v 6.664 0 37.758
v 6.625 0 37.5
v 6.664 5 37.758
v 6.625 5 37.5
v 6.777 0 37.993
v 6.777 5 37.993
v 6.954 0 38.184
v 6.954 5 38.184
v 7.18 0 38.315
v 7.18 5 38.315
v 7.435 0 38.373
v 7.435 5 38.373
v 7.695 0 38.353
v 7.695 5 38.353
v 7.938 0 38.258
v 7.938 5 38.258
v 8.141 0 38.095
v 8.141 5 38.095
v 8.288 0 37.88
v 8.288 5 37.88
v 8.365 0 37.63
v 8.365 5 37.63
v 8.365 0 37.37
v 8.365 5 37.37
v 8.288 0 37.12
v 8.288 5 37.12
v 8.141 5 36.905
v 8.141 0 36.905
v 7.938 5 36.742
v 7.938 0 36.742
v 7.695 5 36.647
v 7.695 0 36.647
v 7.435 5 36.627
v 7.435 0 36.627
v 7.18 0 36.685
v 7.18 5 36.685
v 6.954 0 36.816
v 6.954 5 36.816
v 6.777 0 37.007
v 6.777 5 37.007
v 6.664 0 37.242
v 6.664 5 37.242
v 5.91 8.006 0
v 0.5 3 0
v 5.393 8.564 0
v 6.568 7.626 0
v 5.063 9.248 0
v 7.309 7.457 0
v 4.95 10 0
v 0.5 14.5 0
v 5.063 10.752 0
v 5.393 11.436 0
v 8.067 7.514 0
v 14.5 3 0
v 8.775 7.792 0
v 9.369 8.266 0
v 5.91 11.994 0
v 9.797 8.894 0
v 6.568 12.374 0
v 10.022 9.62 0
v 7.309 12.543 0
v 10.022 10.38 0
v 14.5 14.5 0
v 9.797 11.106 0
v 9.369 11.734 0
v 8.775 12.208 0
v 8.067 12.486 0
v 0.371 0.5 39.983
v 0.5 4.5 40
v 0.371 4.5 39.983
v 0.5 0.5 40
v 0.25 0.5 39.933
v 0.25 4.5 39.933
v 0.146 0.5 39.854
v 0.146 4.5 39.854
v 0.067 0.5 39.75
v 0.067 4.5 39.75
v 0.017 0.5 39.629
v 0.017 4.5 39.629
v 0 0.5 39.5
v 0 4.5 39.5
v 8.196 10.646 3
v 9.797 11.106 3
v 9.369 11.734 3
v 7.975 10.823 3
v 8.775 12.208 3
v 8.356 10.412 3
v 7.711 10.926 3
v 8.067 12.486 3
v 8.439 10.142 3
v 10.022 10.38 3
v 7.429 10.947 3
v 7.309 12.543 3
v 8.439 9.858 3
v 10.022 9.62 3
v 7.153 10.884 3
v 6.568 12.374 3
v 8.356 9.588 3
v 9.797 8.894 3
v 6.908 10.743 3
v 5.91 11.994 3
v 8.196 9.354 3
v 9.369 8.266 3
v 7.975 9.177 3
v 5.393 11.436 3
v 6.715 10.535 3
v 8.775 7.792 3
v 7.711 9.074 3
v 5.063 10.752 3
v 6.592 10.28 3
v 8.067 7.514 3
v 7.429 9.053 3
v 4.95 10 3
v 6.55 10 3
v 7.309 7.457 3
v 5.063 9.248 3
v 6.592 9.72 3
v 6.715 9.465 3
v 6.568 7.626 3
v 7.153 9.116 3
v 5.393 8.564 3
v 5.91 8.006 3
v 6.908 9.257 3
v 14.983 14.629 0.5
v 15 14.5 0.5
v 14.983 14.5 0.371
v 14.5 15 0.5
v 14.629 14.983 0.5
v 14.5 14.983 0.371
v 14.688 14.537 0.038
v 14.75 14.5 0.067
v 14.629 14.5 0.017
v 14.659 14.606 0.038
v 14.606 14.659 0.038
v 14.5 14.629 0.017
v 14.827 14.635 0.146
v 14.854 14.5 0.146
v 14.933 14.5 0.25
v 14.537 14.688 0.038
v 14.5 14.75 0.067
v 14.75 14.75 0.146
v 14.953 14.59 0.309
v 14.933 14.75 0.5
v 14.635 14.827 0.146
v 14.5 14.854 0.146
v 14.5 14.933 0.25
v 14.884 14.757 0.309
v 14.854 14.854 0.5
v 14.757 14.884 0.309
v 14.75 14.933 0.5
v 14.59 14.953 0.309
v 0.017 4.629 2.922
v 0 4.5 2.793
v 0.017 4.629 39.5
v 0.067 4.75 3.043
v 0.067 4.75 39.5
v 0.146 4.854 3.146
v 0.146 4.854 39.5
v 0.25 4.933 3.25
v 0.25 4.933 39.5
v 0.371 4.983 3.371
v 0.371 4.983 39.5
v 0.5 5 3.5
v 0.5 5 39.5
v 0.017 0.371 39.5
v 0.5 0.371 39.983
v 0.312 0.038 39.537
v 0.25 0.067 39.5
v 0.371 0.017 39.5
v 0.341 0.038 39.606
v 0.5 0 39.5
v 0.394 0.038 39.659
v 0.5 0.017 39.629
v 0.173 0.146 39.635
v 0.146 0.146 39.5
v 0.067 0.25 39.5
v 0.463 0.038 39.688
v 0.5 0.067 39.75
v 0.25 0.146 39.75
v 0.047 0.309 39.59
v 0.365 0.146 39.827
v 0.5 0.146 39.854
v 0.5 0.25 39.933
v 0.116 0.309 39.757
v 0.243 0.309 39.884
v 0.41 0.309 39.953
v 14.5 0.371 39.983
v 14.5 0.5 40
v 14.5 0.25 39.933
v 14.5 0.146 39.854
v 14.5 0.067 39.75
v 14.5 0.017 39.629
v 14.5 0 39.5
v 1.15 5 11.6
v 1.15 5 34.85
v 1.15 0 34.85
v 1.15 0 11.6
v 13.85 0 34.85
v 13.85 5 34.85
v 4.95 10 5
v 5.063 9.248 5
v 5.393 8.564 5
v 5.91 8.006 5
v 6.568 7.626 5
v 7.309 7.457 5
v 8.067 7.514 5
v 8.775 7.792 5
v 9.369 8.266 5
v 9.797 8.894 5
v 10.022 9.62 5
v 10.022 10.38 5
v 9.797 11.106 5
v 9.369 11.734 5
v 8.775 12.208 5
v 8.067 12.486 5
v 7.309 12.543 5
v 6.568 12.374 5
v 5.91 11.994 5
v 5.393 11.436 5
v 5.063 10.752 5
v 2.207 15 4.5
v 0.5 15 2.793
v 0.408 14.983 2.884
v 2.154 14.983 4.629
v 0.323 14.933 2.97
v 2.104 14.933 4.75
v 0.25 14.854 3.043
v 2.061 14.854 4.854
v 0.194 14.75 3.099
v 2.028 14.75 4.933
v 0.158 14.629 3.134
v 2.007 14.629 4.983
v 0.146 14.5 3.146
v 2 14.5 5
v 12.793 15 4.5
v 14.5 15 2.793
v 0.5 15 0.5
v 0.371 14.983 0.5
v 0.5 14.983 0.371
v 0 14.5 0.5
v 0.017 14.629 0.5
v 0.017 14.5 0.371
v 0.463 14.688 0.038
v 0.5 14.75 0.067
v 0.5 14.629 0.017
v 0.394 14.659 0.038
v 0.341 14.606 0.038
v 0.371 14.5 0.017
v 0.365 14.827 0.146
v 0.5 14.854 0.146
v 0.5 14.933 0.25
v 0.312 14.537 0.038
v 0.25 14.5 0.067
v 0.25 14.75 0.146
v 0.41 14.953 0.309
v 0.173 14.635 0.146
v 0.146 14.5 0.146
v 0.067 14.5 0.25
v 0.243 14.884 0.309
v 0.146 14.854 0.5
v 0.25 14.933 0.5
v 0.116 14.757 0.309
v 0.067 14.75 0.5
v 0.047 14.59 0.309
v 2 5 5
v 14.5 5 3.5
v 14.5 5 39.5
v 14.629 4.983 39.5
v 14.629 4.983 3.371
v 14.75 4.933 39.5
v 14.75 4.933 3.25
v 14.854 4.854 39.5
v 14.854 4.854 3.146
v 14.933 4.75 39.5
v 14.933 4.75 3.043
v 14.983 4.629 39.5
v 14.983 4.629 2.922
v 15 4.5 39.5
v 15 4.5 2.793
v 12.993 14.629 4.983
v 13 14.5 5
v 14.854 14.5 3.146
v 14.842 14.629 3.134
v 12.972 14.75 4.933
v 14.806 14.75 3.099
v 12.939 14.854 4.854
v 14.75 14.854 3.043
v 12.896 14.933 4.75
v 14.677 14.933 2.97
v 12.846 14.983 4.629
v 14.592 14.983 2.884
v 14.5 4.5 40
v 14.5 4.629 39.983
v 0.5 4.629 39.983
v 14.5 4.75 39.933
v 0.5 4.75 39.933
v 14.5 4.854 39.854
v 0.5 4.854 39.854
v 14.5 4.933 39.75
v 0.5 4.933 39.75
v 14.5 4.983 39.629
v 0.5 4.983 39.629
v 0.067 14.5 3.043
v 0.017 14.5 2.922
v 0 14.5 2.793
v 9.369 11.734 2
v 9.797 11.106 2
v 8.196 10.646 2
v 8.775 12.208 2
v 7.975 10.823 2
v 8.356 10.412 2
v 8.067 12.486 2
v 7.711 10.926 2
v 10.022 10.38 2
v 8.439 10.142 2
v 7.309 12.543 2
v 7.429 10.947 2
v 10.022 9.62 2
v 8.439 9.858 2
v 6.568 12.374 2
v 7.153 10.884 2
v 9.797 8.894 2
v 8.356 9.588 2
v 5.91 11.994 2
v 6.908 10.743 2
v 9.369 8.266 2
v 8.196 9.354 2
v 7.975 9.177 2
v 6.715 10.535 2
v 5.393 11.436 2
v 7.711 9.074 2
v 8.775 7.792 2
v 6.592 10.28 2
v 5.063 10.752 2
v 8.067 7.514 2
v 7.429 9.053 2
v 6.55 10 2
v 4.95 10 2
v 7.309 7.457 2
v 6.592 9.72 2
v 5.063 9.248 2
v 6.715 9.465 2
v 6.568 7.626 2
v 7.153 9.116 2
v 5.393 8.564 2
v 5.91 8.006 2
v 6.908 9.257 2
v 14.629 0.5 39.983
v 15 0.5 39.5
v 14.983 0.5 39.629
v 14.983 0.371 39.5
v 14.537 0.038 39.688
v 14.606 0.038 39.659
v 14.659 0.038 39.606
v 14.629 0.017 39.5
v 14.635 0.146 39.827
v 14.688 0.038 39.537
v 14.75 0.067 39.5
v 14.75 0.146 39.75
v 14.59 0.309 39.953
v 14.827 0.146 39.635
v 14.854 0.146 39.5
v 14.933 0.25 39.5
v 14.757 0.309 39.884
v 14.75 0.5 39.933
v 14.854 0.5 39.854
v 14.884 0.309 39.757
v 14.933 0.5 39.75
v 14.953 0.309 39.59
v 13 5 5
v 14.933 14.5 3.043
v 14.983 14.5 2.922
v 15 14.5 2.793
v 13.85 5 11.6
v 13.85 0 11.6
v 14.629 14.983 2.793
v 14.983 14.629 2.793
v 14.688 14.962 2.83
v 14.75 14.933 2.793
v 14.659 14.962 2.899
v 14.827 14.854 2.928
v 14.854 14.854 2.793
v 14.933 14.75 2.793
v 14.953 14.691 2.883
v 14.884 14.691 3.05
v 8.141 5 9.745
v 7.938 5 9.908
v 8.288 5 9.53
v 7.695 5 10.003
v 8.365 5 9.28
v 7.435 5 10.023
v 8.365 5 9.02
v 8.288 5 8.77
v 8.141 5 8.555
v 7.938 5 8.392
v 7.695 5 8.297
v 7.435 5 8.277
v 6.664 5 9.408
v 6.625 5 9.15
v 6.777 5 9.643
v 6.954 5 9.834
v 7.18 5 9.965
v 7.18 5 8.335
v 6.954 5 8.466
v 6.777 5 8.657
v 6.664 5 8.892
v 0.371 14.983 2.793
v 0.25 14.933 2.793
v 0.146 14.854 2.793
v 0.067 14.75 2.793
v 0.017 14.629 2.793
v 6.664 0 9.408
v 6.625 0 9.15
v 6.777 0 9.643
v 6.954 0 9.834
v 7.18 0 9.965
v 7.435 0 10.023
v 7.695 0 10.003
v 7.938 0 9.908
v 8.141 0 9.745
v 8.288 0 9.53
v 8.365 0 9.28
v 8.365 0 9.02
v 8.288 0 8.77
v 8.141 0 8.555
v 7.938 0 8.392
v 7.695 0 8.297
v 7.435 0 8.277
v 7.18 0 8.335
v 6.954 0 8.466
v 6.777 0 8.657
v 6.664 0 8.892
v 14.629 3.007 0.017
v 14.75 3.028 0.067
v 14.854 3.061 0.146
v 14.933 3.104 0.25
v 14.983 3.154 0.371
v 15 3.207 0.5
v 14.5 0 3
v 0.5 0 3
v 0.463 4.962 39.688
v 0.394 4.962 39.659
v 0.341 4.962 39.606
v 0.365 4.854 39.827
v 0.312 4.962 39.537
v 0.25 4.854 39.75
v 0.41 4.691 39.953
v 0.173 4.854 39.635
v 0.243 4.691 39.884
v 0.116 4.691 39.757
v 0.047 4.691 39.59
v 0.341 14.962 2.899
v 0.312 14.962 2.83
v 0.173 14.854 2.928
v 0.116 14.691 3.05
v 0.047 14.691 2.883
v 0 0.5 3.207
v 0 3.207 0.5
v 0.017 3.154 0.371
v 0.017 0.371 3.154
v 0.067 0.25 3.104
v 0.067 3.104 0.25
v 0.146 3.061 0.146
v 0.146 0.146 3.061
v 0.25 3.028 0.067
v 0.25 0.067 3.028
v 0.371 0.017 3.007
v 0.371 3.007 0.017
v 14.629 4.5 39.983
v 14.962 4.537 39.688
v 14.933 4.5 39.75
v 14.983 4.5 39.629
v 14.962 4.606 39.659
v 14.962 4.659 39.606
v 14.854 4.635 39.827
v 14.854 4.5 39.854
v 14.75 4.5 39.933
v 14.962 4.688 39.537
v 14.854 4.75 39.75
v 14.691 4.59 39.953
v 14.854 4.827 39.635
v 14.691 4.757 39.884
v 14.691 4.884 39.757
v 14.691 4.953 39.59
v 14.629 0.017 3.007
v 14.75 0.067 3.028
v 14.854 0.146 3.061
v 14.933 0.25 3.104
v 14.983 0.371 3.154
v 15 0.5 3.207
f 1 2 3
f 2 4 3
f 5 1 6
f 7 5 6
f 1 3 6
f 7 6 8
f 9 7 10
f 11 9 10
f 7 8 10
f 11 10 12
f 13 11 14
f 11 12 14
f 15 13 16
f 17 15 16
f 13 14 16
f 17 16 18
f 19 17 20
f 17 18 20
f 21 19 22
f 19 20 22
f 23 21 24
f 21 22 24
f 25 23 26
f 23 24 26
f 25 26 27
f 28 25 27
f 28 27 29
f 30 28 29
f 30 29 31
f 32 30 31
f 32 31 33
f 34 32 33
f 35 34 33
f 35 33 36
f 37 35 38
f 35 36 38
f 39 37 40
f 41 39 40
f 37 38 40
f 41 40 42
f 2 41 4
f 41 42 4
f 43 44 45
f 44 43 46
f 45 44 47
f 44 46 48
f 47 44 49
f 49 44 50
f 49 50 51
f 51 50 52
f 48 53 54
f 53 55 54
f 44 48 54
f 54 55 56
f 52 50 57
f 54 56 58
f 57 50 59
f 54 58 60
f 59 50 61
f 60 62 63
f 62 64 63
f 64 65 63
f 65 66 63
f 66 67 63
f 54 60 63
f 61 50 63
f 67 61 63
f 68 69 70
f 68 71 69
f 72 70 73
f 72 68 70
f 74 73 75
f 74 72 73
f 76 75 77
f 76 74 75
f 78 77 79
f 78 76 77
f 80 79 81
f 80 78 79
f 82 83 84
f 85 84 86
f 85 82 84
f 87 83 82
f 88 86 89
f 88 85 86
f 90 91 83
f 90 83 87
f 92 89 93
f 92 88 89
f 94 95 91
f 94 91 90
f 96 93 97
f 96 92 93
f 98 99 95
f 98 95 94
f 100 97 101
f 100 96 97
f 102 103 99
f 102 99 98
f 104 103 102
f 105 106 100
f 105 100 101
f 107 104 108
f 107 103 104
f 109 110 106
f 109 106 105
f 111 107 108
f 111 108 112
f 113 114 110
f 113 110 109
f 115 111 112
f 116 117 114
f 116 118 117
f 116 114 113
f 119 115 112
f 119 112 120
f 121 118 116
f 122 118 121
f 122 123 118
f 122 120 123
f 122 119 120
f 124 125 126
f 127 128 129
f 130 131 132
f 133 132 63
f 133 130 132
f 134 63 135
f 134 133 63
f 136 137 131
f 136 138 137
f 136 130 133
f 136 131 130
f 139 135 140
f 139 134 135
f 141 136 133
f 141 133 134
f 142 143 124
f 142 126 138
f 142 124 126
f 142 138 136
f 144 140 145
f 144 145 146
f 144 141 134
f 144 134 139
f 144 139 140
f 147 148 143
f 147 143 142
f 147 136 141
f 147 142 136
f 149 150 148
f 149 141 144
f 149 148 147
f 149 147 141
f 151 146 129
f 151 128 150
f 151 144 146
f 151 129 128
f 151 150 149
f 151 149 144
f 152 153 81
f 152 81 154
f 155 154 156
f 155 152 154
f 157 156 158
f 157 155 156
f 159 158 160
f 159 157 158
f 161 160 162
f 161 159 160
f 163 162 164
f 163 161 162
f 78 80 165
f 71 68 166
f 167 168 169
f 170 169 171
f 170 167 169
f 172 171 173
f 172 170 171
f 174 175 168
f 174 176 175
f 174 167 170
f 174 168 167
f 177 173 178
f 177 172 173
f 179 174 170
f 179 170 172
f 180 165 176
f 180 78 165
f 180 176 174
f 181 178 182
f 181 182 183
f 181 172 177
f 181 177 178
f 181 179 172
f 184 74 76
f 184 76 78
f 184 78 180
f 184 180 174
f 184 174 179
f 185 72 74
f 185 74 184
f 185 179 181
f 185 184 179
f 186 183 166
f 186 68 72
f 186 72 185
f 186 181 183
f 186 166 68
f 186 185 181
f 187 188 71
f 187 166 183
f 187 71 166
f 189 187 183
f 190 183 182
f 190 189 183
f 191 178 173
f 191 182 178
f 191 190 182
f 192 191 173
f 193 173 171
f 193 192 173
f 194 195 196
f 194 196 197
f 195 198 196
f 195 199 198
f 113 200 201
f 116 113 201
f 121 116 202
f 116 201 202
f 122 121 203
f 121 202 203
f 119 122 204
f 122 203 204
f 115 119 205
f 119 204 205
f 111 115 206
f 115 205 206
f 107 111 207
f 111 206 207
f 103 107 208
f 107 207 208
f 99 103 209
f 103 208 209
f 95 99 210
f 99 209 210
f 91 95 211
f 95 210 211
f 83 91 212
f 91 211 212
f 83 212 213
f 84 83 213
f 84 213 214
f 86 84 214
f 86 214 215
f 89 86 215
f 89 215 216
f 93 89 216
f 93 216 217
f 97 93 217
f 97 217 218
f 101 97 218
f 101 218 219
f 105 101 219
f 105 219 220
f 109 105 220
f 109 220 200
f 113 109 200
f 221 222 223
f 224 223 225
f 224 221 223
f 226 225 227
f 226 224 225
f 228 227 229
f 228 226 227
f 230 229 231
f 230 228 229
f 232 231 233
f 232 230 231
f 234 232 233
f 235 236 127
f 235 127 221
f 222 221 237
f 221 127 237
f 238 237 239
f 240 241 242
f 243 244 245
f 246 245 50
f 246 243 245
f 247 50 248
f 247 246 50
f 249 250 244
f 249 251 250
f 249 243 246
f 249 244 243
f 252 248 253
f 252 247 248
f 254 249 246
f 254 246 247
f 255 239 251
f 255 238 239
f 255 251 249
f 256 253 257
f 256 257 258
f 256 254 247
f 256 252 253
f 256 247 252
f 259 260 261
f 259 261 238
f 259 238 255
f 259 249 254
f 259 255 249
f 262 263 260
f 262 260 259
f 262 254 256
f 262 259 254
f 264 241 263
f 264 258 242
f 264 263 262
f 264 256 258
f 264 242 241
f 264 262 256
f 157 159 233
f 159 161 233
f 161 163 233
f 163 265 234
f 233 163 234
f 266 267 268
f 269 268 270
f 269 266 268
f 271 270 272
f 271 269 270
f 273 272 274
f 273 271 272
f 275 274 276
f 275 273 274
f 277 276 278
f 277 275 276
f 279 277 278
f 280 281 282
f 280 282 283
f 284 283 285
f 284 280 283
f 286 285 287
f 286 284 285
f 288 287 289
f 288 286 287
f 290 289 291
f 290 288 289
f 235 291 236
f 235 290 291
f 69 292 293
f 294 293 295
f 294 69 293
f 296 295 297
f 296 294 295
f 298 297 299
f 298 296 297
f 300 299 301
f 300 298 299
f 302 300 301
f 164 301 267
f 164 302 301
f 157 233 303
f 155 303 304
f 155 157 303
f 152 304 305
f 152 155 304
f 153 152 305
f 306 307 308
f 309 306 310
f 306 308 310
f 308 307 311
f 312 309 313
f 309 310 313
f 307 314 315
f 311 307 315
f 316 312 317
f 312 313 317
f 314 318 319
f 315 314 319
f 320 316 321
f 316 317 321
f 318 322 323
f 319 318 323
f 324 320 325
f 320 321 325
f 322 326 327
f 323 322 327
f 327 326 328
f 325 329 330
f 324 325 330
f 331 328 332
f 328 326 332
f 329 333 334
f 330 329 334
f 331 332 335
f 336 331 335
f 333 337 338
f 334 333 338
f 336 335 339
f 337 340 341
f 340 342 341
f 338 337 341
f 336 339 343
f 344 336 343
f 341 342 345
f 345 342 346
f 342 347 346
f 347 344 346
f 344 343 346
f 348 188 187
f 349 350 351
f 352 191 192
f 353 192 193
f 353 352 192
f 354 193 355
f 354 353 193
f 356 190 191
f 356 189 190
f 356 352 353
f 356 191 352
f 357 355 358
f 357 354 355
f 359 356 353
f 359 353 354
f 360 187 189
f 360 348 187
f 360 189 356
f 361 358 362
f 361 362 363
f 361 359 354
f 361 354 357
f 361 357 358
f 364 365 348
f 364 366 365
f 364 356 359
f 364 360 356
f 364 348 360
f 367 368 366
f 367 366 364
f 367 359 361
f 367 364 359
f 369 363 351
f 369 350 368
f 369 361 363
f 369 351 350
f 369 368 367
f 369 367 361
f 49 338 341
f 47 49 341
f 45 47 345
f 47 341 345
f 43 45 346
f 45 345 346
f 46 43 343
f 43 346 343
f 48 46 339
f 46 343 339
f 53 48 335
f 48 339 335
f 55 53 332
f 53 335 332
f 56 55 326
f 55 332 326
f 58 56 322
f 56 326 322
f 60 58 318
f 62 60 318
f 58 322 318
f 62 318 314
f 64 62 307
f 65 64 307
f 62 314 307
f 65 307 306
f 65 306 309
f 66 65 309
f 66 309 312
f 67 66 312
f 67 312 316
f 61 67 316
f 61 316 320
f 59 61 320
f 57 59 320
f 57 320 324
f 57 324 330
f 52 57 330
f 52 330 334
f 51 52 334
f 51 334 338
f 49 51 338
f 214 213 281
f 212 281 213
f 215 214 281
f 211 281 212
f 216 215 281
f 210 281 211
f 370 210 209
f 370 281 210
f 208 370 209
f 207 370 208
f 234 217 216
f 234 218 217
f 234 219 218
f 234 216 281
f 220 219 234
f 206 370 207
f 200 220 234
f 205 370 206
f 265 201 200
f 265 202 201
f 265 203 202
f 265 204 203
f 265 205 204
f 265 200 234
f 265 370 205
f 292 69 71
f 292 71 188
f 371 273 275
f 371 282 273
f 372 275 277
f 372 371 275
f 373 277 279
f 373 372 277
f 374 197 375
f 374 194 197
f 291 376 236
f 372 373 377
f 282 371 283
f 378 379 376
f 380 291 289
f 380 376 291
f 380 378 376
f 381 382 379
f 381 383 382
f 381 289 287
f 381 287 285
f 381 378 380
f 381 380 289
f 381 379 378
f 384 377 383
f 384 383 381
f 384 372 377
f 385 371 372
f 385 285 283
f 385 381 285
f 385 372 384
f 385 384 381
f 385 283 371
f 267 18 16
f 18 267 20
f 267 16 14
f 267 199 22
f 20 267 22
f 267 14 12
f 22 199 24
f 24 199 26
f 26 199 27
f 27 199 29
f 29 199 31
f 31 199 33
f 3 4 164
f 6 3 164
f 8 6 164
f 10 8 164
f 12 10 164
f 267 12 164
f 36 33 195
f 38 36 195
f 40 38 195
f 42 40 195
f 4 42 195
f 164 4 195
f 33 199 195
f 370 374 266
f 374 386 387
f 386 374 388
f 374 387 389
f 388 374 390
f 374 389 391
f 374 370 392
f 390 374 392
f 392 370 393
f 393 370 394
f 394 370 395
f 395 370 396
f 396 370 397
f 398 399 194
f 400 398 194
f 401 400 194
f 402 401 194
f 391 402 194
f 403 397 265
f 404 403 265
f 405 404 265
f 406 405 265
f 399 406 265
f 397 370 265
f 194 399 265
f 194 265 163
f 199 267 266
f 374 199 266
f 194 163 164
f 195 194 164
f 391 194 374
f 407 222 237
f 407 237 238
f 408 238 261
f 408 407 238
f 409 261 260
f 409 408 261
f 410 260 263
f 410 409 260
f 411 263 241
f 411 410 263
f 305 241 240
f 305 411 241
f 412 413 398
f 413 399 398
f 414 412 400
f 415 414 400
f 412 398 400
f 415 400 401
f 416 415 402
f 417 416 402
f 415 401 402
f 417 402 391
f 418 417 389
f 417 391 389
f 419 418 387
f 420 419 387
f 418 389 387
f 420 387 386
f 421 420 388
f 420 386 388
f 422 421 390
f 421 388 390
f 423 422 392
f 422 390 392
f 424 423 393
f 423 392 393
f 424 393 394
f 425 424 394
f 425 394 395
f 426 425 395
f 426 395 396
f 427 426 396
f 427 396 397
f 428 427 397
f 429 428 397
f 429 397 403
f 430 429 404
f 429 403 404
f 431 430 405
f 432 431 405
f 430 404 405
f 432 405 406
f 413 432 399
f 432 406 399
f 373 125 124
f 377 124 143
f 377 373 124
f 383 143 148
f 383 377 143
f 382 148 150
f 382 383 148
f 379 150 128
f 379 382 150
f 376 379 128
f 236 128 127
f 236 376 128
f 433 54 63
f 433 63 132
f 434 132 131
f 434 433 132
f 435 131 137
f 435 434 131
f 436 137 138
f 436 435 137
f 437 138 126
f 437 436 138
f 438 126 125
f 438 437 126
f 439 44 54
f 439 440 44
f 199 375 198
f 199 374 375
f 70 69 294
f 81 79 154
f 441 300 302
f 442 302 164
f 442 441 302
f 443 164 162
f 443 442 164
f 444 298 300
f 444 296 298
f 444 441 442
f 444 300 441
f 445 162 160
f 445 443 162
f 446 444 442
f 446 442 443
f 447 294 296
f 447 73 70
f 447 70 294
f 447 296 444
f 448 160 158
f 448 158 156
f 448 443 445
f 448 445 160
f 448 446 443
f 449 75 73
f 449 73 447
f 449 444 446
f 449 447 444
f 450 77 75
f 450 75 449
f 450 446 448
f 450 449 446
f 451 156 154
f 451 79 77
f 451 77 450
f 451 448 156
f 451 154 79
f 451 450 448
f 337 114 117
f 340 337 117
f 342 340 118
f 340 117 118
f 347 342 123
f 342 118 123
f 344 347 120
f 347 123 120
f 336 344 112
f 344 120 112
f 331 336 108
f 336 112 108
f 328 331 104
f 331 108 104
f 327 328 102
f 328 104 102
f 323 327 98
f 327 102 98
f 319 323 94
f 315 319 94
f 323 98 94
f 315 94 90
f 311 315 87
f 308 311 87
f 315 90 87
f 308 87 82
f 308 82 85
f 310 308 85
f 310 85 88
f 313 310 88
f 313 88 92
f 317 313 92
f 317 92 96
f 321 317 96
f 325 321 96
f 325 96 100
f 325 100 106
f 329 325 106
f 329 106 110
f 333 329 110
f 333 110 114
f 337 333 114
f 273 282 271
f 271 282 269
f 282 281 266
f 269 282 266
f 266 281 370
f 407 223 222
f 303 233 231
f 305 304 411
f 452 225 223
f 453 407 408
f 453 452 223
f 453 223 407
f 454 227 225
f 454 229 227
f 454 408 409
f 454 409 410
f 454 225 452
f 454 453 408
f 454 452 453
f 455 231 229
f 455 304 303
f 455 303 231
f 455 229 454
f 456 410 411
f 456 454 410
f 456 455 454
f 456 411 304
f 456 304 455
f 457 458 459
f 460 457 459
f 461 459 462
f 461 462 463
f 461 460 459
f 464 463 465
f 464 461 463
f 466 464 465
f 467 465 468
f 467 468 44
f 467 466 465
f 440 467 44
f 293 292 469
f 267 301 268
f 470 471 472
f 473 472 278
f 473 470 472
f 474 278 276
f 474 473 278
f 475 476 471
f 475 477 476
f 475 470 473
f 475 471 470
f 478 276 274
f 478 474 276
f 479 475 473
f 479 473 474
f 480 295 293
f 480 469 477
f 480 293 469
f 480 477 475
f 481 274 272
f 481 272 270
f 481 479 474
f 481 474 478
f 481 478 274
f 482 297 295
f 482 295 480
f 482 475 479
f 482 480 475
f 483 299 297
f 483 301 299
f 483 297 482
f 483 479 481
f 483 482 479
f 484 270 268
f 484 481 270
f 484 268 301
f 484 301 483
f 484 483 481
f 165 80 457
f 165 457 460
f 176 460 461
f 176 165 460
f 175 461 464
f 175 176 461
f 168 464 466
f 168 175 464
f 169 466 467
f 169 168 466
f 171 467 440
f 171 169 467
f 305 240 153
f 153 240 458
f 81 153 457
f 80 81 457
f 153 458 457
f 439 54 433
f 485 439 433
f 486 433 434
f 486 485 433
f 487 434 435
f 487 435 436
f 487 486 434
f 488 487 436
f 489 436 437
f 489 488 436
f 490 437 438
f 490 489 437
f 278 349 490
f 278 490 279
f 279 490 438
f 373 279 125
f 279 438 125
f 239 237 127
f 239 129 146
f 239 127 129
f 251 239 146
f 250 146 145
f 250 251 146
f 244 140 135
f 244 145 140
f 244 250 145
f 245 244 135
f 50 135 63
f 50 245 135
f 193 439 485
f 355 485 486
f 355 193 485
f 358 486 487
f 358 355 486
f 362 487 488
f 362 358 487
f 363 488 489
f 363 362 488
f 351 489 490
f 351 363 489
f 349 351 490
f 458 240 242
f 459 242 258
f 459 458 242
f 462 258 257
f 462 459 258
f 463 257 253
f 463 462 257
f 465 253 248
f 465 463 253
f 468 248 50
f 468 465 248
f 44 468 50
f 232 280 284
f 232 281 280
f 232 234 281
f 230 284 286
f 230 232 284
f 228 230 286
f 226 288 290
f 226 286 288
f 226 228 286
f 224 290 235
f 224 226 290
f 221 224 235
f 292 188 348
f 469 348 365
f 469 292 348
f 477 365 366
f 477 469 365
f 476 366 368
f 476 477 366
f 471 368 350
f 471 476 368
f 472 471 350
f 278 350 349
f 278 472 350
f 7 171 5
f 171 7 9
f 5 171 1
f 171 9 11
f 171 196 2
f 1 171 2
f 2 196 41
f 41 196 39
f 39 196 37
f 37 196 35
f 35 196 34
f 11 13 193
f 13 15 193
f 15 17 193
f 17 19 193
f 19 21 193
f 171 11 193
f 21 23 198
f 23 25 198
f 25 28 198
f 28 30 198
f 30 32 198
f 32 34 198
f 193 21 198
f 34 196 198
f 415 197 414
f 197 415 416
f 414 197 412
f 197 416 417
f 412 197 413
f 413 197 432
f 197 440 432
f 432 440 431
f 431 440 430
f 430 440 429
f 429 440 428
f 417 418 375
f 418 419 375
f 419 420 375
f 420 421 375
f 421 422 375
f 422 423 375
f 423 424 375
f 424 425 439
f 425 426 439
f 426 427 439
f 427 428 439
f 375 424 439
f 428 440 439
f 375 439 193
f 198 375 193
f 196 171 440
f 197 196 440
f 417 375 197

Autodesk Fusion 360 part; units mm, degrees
sketch "Sketch1" plane through (0, 0, 0) normal (0, 0, 1) x (1, 0, 0)
  line L0 (0, 0) -> (15, 0)
  line L1 (15, 0) -> (15, 15)
  line L2 (15, 15) -> (0, 15)
  line L3 (0, 15) -> (0, 0)
  line L4 (0, 0) -> (15, 0)
  line L5 (15, 0) -> (15, 5)
  line L6 (15, 5) -> (0, 5)
  line L7 (0, 5) -> (0, 0)
  dimension "d1" = 15
  dimension "d2" = 15
extrude "Extrude1" add sketch "Sketch1" along normal blind 5 contours L1 L2 L3 L6
extrude "Extrude2" add sketch "Sketch1" along normal blind 40 contours L0 L1 L3 L4 L5 L6 L7
sketch "Sketch2" plane through (0, 5, 0) normal (0, 1, 0) x (-1, 0, 0)
  line L0 (-15, 5) -> (0, 5)
  line L1 (0, 5) -> (0, 40)
  line L2 (0, 40) -> (-15, 40)
  line L3 (-15, 40) -> (-15, 5)
  line L4 (-13.85, 11.6) -> (-13.85, 34.85)
  line L5 (-1.15, 11.6) -> (-13.85, 11.6)
  circle A0 centre (-7.5, 9.15) radius 0.875
  line L6 (-1.15, 34.85) -> (-1.15, 11.6)
  circle A1 centre (-7.5, 37.5) radius 0.875
  line L7 (-13.85, 34.85) -> (-1.15, 34.85)
  dimension "d7" = 23.25
  dimension "d8" = 12.7
  dimension "d9" = 1.75
  dimension "d10" = 1.75
  dimension "d11" = 2.45
  dimension "d12" = 2.65
  dimension "d13" = 1.15
  dimension "d14" = 2.5
extrude "Extrude3" cut sketch "Sketch2" against normal blind 5 contours L4 L5 L6 L7 | A0 | A1
sketch "Sketch3" plane through (0, 0, 5) normal (0, 0, 1) x (-1, 0, 0)
  line L0 (-15, -15) -> (0, -15)
  line L1 (0, -15) -> (0, -5)
  line L2 (0, -5) -> (-15, -5)
  line L3 (-15, -5) -> (-15, -15)
  circle A0 centre (-7.5, -10) radius 0.95
  circle A1 centre (-7.5, -10) radius 2.55
  line L4 (-15, -15) -> (0, -15)
  dimension "d17" = 5.1
  dimension "d18" = 1.9
  dimension "d19" = 7.5
  dimension "d20" = 5
extrude "Extrude4" cut sketch "Sketch3" against normal blind 5 contours A0 | A1
extrude "Extrude7" add sketch "Sketch3" against normal blind 3 contours A1
extrude "Extrude8" cut sketch "Sketch3" against normal blind 2 contours A1
chamfer "Chamfer2" distance 3 angle 45 1 edges at (7.5, 0, 0)
chamfer "Chamfer3" distance 2 angle 45 2 edges at (15, 10, 5) (0, 10, 5)
fillet "Fillet4" radius 0.5 4 faces at (5, 3.3333, 40) (15, 1.6667, 16) (0, 3.3333, 27.6667) (9.3333, 15, 1.6667)
fillet "Fillet3" [suppressed]
